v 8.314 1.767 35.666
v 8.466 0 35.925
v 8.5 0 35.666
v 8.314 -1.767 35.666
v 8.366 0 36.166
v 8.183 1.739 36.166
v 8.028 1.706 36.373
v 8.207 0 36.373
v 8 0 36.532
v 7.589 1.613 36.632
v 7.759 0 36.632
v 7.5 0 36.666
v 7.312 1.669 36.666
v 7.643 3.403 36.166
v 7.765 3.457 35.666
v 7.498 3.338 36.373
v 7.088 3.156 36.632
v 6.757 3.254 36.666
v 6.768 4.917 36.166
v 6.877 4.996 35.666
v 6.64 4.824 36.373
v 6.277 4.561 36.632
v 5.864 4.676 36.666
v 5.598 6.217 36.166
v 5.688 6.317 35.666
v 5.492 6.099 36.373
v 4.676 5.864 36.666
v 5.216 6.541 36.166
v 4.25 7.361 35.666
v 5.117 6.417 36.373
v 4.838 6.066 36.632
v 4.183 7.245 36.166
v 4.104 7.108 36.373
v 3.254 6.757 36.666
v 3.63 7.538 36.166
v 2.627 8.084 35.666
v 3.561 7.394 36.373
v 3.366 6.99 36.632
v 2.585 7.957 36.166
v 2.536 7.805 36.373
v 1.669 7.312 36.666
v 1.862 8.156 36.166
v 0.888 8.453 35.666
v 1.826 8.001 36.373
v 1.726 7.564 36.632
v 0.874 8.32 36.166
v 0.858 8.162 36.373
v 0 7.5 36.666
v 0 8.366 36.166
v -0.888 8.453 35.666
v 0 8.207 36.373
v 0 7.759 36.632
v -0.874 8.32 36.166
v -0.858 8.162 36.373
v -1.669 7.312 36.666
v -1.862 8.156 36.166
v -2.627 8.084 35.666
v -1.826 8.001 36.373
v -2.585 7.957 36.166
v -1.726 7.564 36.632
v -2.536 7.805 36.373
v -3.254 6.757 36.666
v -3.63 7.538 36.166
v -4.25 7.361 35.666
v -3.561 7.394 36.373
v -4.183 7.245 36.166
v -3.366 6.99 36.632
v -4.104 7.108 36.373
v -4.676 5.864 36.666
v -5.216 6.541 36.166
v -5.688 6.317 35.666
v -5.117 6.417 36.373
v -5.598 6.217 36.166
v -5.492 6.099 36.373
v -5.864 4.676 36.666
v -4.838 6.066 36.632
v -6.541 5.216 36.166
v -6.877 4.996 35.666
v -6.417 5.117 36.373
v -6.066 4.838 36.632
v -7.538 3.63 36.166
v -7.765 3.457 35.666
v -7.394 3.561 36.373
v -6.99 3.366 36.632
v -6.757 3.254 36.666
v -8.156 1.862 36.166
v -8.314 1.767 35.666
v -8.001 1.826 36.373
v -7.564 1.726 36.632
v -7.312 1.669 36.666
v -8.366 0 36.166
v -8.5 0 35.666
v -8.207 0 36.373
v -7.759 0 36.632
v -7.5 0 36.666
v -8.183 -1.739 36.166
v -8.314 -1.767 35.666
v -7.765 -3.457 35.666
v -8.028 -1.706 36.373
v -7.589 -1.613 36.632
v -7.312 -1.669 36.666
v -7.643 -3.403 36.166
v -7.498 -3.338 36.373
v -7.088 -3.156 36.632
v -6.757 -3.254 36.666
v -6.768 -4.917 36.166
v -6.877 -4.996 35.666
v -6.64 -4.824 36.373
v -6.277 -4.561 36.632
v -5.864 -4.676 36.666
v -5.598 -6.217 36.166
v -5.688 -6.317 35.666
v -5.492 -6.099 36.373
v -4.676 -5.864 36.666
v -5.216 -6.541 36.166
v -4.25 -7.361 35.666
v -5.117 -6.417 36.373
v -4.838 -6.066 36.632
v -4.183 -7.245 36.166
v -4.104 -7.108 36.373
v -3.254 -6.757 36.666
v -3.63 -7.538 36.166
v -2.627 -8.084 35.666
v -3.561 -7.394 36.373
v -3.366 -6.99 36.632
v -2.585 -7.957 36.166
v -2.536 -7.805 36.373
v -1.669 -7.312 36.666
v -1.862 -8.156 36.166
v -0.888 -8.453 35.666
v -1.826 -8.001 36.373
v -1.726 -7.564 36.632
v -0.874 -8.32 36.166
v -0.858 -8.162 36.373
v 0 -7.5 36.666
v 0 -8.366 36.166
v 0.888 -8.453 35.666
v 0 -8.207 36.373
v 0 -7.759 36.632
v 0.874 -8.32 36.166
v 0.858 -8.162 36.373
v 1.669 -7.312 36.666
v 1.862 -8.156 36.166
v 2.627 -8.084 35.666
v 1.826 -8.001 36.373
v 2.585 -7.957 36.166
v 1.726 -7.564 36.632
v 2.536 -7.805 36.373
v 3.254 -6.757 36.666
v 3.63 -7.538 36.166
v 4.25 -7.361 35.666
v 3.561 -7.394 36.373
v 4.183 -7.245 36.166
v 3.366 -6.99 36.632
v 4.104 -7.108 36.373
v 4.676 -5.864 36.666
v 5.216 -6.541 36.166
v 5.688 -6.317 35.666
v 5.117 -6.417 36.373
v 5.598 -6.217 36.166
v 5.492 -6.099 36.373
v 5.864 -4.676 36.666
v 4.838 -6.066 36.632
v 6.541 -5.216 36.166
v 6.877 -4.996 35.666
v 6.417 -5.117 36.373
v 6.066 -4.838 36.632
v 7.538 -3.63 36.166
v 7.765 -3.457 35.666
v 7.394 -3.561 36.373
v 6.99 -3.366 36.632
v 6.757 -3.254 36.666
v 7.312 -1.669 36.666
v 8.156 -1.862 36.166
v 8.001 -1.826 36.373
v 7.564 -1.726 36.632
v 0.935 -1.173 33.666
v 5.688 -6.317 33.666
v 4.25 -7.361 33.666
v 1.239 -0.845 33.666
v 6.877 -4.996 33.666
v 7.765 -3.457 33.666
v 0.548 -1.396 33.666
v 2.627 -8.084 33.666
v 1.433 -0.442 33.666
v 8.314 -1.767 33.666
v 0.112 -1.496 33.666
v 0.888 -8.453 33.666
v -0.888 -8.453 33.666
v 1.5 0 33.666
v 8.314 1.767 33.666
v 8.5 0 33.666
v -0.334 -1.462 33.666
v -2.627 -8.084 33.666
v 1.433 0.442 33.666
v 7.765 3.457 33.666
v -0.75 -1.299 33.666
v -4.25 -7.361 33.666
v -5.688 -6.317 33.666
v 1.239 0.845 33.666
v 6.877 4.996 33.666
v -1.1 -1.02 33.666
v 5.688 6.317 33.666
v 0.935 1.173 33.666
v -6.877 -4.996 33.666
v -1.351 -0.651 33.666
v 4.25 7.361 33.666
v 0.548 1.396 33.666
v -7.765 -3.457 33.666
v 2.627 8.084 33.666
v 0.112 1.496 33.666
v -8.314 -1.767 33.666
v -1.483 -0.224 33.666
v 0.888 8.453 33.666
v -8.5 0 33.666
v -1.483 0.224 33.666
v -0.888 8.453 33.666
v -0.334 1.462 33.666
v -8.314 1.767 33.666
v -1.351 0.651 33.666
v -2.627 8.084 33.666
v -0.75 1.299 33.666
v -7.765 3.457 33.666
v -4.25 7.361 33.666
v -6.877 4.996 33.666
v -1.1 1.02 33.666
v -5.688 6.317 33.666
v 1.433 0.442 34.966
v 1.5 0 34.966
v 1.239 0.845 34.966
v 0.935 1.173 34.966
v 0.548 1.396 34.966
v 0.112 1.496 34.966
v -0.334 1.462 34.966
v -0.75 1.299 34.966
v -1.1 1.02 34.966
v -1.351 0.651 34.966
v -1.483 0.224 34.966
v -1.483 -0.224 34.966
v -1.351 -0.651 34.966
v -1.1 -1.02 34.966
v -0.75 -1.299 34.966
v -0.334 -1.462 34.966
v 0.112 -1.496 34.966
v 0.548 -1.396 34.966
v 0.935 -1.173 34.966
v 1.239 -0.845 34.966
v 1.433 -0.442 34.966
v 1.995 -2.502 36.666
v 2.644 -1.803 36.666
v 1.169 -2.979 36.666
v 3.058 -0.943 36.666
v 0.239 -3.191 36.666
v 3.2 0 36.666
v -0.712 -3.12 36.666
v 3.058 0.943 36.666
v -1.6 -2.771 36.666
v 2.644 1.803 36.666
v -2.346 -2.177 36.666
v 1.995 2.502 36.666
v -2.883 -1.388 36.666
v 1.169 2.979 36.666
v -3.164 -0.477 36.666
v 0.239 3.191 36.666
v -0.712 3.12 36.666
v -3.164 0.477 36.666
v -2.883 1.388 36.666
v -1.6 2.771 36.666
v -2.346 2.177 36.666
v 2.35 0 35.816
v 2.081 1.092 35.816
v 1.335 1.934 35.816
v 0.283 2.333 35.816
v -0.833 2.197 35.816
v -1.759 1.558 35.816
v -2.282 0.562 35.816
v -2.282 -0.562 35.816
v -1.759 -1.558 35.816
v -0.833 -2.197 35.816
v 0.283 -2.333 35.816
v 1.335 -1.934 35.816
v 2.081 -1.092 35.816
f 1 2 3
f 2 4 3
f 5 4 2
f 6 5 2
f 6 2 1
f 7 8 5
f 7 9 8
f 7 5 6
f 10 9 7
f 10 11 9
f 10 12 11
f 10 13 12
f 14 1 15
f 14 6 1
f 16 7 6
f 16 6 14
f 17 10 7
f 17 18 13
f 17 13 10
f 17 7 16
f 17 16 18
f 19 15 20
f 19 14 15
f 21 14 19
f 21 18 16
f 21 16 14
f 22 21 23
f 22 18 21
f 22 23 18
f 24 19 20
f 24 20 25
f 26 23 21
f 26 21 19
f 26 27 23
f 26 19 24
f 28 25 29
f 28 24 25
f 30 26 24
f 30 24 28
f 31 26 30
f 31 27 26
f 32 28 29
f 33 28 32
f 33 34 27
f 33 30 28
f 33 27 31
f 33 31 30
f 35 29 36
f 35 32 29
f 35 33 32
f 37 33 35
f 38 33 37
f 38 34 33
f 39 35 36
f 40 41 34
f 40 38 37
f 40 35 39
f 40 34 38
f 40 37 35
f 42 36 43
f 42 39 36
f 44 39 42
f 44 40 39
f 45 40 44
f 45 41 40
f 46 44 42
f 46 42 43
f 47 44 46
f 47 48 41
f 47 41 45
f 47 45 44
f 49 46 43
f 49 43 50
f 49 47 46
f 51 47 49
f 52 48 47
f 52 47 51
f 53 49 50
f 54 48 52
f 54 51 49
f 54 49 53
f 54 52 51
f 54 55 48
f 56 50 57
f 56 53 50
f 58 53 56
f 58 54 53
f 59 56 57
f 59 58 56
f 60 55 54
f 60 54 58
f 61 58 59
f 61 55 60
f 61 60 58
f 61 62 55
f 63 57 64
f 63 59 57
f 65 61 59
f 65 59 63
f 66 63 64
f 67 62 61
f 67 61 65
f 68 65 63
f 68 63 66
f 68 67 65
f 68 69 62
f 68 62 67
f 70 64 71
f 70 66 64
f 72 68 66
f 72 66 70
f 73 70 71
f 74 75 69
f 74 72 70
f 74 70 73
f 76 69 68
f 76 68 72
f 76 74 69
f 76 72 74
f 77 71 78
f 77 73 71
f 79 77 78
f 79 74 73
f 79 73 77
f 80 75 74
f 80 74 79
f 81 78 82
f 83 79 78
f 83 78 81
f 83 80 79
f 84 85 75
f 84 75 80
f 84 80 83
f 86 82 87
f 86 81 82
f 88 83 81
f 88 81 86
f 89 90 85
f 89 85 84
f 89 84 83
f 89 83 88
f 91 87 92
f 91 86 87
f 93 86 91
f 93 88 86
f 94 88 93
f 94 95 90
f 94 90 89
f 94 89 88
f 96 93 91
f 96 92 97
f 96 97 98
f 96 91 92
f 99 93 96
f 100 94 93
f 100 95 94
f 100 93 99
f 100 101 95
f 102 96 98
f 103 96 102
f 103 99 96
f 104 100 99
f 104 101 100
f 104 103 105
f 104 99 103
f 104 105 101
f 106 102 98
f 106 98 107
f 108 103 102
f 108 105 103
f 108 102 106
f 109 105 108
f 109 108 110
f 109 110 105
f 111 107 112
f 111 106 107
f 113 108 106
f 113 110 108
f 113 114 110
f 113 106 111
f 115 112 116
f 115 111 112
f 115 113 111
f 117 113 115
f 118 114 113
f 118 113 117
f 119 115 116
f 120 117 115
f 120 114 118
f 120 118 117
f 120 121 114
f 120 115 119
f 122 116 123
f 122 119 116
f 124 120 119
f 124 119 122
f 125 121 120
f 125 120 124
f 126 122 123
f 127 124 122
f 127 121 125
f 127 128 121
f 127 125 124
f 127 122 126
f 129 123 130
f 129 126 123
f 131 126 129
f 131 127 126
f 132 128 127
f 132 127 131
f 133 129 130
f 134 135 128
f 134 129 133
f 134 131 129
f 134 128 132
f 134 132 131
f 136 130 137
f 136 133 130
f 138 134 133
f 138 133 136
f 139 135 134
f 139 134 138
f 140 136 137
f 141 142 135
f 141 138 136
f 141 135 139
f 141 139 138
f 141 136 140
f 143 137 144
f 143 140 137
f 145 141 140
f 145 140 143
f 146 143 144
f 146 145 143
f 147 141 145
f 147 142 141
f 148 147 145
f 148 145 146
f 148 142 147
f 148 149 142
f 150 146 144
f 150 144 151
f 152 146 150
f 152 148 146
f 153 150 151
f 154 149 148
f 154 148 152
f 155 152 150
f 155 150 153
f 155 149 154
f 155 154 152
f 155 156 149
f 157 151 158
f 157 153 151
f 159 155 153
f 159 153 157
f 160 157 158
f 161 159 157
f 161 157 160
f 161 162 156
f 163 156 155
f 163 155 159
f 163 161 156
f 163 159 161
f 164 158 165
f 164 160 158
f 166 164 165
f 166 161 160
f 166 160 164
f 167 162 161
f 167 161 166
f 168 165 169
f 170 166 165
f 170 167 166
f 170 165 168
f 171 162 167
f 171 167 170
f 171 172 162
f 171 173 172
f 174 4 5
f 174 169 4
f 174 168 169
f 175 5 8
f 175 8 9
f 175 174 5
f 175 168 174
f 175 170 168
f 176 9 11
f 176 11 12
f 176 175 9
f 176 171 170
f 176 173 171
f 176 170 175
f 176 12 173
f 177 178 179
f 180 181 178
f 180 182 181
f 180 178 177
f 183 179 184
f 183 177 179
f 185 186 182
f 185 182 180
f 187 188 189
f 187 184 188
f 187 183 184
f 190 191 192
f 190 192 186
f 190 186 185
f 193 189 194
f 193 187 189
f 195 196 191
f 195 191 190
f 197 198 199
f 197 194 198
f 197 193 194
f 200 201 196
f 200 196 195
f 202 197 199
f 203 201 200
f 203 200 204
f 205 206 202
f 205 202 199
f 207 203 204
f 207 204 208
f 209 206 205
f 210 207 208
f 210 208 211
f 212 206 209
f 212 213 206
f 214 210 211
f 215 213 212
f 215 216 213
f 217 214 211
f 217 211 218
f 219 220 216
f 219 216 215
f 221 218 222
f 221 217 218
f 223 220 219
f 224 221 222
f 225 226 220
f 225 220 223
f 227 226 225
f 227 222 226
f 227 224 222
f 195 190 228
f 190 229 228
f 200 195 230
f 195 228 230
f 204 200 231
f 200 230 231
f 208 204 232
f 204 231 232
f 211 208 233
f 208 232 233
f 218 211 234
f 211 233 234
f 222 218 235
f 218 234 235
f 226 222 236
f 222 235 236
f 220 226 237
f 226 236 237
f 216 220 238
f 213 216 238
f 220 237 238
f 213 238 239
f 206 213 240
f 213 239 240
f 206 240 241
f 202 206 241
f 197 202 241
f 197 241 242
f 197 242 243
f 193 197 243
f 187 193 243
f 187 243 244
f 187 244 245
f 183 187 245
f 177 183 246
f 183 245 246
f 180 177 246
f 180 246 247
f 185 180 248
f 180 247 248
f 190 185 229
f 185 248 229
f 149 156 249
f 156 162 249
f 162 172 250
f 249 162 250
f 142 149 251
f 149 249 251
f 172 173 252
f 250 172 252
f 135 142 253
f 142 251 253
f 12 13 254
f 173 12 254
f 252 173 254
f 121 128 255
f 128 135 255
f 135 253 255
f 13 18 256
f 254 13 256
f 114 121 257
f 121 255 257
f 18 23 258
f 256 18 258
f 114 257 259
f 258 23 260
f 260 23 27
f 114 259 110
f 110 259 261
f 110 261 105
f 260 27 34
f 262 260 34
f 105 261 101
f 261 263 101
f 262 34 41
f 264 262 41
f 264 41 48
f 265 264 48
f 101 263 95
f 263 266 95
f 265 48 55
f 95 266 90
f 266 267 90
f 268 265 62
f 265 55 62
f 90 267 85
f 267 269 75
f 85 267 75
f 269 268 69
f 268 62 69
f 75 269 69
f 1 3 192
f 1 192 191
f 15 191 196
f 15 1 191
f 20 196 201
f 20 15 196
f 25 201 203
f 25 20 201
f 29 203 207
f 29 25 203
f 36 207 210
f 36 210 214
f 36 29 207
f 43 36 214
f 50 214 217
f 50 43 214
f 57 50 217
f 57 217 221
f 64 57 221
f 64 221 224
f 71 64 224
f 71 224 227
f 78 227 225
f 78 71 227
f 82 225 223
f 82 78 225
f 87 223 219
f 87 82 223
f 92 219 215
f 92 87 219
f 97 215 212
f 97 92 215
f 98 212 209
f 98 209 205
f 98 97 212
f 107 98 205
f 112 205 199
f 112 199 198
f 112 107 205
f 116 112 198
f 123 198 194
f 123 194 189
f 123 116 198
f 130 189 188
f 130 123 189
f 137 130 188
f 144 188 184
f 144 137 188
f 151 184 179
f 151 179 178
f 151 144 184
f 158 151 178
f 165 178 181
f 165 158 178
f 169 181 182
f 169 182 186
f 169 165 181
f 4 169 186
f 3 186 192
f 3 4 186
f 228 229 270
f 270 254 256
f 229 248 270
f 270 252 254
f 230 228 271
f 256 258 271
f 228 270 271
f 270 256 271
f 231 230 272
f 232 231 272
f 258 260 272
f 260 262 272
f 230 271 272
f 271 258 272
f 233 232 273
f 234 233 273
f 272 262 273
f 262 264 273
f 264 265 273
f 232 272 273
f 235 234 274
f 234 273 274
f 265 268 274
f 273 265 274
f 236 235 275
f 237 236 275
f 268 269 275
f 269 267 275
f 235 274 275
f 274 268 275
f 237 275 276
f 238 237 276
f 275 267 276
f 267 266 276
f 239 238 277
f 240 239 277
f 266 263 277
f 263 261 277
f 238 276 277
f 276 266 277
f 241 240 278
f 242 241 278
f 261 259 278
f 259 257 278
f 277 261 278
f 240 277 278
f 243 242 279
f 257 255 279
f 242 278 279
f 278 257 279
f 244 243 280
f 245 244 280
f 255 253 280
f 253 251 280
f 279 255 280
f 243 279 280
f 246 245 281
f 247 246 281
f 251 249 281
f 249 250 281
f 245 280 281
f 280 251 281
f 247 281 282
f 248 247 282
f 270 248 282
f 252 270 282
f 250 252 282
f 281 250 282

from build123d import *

# Parameters (mm, degrees)
SKETCH003_W = 8.5
SKETCH003_H = 3
FILLET_R    = 1


with BuildPart() as part:
    # Sketch003 → Revolution002 (revolve)
    with BuildSketch(Plane.XZ):
        with Locations((4.25, 35.166221)):
            Rectangle(SKETCH003_W, SKETCH003_H)
    revolve(axis=Axis((0, 0, 0), (0, 0, 1)))

    # Fillet
    fillet_edges = [part.edges().sort_by_distance(p)[0] for p in [
        (-8.5, 0, 36.666221),
    ]]
    fillet(fillet_edges, radius=FILLET_R)

    # Sketch004 → Groove (revolve, cut)
    with BuildSketch(Plane.XZ):
        Polygon((0, 36.666221), (0, 29.34667), (1.5, 29.34667), (1.5, 34.966221), (3.2, 36.666221), align=None)
    revolve(axis=Axis((0, 0, 0), (0, 0, 1)), mode=Mode.SUBTRACT)


solid = part.part
